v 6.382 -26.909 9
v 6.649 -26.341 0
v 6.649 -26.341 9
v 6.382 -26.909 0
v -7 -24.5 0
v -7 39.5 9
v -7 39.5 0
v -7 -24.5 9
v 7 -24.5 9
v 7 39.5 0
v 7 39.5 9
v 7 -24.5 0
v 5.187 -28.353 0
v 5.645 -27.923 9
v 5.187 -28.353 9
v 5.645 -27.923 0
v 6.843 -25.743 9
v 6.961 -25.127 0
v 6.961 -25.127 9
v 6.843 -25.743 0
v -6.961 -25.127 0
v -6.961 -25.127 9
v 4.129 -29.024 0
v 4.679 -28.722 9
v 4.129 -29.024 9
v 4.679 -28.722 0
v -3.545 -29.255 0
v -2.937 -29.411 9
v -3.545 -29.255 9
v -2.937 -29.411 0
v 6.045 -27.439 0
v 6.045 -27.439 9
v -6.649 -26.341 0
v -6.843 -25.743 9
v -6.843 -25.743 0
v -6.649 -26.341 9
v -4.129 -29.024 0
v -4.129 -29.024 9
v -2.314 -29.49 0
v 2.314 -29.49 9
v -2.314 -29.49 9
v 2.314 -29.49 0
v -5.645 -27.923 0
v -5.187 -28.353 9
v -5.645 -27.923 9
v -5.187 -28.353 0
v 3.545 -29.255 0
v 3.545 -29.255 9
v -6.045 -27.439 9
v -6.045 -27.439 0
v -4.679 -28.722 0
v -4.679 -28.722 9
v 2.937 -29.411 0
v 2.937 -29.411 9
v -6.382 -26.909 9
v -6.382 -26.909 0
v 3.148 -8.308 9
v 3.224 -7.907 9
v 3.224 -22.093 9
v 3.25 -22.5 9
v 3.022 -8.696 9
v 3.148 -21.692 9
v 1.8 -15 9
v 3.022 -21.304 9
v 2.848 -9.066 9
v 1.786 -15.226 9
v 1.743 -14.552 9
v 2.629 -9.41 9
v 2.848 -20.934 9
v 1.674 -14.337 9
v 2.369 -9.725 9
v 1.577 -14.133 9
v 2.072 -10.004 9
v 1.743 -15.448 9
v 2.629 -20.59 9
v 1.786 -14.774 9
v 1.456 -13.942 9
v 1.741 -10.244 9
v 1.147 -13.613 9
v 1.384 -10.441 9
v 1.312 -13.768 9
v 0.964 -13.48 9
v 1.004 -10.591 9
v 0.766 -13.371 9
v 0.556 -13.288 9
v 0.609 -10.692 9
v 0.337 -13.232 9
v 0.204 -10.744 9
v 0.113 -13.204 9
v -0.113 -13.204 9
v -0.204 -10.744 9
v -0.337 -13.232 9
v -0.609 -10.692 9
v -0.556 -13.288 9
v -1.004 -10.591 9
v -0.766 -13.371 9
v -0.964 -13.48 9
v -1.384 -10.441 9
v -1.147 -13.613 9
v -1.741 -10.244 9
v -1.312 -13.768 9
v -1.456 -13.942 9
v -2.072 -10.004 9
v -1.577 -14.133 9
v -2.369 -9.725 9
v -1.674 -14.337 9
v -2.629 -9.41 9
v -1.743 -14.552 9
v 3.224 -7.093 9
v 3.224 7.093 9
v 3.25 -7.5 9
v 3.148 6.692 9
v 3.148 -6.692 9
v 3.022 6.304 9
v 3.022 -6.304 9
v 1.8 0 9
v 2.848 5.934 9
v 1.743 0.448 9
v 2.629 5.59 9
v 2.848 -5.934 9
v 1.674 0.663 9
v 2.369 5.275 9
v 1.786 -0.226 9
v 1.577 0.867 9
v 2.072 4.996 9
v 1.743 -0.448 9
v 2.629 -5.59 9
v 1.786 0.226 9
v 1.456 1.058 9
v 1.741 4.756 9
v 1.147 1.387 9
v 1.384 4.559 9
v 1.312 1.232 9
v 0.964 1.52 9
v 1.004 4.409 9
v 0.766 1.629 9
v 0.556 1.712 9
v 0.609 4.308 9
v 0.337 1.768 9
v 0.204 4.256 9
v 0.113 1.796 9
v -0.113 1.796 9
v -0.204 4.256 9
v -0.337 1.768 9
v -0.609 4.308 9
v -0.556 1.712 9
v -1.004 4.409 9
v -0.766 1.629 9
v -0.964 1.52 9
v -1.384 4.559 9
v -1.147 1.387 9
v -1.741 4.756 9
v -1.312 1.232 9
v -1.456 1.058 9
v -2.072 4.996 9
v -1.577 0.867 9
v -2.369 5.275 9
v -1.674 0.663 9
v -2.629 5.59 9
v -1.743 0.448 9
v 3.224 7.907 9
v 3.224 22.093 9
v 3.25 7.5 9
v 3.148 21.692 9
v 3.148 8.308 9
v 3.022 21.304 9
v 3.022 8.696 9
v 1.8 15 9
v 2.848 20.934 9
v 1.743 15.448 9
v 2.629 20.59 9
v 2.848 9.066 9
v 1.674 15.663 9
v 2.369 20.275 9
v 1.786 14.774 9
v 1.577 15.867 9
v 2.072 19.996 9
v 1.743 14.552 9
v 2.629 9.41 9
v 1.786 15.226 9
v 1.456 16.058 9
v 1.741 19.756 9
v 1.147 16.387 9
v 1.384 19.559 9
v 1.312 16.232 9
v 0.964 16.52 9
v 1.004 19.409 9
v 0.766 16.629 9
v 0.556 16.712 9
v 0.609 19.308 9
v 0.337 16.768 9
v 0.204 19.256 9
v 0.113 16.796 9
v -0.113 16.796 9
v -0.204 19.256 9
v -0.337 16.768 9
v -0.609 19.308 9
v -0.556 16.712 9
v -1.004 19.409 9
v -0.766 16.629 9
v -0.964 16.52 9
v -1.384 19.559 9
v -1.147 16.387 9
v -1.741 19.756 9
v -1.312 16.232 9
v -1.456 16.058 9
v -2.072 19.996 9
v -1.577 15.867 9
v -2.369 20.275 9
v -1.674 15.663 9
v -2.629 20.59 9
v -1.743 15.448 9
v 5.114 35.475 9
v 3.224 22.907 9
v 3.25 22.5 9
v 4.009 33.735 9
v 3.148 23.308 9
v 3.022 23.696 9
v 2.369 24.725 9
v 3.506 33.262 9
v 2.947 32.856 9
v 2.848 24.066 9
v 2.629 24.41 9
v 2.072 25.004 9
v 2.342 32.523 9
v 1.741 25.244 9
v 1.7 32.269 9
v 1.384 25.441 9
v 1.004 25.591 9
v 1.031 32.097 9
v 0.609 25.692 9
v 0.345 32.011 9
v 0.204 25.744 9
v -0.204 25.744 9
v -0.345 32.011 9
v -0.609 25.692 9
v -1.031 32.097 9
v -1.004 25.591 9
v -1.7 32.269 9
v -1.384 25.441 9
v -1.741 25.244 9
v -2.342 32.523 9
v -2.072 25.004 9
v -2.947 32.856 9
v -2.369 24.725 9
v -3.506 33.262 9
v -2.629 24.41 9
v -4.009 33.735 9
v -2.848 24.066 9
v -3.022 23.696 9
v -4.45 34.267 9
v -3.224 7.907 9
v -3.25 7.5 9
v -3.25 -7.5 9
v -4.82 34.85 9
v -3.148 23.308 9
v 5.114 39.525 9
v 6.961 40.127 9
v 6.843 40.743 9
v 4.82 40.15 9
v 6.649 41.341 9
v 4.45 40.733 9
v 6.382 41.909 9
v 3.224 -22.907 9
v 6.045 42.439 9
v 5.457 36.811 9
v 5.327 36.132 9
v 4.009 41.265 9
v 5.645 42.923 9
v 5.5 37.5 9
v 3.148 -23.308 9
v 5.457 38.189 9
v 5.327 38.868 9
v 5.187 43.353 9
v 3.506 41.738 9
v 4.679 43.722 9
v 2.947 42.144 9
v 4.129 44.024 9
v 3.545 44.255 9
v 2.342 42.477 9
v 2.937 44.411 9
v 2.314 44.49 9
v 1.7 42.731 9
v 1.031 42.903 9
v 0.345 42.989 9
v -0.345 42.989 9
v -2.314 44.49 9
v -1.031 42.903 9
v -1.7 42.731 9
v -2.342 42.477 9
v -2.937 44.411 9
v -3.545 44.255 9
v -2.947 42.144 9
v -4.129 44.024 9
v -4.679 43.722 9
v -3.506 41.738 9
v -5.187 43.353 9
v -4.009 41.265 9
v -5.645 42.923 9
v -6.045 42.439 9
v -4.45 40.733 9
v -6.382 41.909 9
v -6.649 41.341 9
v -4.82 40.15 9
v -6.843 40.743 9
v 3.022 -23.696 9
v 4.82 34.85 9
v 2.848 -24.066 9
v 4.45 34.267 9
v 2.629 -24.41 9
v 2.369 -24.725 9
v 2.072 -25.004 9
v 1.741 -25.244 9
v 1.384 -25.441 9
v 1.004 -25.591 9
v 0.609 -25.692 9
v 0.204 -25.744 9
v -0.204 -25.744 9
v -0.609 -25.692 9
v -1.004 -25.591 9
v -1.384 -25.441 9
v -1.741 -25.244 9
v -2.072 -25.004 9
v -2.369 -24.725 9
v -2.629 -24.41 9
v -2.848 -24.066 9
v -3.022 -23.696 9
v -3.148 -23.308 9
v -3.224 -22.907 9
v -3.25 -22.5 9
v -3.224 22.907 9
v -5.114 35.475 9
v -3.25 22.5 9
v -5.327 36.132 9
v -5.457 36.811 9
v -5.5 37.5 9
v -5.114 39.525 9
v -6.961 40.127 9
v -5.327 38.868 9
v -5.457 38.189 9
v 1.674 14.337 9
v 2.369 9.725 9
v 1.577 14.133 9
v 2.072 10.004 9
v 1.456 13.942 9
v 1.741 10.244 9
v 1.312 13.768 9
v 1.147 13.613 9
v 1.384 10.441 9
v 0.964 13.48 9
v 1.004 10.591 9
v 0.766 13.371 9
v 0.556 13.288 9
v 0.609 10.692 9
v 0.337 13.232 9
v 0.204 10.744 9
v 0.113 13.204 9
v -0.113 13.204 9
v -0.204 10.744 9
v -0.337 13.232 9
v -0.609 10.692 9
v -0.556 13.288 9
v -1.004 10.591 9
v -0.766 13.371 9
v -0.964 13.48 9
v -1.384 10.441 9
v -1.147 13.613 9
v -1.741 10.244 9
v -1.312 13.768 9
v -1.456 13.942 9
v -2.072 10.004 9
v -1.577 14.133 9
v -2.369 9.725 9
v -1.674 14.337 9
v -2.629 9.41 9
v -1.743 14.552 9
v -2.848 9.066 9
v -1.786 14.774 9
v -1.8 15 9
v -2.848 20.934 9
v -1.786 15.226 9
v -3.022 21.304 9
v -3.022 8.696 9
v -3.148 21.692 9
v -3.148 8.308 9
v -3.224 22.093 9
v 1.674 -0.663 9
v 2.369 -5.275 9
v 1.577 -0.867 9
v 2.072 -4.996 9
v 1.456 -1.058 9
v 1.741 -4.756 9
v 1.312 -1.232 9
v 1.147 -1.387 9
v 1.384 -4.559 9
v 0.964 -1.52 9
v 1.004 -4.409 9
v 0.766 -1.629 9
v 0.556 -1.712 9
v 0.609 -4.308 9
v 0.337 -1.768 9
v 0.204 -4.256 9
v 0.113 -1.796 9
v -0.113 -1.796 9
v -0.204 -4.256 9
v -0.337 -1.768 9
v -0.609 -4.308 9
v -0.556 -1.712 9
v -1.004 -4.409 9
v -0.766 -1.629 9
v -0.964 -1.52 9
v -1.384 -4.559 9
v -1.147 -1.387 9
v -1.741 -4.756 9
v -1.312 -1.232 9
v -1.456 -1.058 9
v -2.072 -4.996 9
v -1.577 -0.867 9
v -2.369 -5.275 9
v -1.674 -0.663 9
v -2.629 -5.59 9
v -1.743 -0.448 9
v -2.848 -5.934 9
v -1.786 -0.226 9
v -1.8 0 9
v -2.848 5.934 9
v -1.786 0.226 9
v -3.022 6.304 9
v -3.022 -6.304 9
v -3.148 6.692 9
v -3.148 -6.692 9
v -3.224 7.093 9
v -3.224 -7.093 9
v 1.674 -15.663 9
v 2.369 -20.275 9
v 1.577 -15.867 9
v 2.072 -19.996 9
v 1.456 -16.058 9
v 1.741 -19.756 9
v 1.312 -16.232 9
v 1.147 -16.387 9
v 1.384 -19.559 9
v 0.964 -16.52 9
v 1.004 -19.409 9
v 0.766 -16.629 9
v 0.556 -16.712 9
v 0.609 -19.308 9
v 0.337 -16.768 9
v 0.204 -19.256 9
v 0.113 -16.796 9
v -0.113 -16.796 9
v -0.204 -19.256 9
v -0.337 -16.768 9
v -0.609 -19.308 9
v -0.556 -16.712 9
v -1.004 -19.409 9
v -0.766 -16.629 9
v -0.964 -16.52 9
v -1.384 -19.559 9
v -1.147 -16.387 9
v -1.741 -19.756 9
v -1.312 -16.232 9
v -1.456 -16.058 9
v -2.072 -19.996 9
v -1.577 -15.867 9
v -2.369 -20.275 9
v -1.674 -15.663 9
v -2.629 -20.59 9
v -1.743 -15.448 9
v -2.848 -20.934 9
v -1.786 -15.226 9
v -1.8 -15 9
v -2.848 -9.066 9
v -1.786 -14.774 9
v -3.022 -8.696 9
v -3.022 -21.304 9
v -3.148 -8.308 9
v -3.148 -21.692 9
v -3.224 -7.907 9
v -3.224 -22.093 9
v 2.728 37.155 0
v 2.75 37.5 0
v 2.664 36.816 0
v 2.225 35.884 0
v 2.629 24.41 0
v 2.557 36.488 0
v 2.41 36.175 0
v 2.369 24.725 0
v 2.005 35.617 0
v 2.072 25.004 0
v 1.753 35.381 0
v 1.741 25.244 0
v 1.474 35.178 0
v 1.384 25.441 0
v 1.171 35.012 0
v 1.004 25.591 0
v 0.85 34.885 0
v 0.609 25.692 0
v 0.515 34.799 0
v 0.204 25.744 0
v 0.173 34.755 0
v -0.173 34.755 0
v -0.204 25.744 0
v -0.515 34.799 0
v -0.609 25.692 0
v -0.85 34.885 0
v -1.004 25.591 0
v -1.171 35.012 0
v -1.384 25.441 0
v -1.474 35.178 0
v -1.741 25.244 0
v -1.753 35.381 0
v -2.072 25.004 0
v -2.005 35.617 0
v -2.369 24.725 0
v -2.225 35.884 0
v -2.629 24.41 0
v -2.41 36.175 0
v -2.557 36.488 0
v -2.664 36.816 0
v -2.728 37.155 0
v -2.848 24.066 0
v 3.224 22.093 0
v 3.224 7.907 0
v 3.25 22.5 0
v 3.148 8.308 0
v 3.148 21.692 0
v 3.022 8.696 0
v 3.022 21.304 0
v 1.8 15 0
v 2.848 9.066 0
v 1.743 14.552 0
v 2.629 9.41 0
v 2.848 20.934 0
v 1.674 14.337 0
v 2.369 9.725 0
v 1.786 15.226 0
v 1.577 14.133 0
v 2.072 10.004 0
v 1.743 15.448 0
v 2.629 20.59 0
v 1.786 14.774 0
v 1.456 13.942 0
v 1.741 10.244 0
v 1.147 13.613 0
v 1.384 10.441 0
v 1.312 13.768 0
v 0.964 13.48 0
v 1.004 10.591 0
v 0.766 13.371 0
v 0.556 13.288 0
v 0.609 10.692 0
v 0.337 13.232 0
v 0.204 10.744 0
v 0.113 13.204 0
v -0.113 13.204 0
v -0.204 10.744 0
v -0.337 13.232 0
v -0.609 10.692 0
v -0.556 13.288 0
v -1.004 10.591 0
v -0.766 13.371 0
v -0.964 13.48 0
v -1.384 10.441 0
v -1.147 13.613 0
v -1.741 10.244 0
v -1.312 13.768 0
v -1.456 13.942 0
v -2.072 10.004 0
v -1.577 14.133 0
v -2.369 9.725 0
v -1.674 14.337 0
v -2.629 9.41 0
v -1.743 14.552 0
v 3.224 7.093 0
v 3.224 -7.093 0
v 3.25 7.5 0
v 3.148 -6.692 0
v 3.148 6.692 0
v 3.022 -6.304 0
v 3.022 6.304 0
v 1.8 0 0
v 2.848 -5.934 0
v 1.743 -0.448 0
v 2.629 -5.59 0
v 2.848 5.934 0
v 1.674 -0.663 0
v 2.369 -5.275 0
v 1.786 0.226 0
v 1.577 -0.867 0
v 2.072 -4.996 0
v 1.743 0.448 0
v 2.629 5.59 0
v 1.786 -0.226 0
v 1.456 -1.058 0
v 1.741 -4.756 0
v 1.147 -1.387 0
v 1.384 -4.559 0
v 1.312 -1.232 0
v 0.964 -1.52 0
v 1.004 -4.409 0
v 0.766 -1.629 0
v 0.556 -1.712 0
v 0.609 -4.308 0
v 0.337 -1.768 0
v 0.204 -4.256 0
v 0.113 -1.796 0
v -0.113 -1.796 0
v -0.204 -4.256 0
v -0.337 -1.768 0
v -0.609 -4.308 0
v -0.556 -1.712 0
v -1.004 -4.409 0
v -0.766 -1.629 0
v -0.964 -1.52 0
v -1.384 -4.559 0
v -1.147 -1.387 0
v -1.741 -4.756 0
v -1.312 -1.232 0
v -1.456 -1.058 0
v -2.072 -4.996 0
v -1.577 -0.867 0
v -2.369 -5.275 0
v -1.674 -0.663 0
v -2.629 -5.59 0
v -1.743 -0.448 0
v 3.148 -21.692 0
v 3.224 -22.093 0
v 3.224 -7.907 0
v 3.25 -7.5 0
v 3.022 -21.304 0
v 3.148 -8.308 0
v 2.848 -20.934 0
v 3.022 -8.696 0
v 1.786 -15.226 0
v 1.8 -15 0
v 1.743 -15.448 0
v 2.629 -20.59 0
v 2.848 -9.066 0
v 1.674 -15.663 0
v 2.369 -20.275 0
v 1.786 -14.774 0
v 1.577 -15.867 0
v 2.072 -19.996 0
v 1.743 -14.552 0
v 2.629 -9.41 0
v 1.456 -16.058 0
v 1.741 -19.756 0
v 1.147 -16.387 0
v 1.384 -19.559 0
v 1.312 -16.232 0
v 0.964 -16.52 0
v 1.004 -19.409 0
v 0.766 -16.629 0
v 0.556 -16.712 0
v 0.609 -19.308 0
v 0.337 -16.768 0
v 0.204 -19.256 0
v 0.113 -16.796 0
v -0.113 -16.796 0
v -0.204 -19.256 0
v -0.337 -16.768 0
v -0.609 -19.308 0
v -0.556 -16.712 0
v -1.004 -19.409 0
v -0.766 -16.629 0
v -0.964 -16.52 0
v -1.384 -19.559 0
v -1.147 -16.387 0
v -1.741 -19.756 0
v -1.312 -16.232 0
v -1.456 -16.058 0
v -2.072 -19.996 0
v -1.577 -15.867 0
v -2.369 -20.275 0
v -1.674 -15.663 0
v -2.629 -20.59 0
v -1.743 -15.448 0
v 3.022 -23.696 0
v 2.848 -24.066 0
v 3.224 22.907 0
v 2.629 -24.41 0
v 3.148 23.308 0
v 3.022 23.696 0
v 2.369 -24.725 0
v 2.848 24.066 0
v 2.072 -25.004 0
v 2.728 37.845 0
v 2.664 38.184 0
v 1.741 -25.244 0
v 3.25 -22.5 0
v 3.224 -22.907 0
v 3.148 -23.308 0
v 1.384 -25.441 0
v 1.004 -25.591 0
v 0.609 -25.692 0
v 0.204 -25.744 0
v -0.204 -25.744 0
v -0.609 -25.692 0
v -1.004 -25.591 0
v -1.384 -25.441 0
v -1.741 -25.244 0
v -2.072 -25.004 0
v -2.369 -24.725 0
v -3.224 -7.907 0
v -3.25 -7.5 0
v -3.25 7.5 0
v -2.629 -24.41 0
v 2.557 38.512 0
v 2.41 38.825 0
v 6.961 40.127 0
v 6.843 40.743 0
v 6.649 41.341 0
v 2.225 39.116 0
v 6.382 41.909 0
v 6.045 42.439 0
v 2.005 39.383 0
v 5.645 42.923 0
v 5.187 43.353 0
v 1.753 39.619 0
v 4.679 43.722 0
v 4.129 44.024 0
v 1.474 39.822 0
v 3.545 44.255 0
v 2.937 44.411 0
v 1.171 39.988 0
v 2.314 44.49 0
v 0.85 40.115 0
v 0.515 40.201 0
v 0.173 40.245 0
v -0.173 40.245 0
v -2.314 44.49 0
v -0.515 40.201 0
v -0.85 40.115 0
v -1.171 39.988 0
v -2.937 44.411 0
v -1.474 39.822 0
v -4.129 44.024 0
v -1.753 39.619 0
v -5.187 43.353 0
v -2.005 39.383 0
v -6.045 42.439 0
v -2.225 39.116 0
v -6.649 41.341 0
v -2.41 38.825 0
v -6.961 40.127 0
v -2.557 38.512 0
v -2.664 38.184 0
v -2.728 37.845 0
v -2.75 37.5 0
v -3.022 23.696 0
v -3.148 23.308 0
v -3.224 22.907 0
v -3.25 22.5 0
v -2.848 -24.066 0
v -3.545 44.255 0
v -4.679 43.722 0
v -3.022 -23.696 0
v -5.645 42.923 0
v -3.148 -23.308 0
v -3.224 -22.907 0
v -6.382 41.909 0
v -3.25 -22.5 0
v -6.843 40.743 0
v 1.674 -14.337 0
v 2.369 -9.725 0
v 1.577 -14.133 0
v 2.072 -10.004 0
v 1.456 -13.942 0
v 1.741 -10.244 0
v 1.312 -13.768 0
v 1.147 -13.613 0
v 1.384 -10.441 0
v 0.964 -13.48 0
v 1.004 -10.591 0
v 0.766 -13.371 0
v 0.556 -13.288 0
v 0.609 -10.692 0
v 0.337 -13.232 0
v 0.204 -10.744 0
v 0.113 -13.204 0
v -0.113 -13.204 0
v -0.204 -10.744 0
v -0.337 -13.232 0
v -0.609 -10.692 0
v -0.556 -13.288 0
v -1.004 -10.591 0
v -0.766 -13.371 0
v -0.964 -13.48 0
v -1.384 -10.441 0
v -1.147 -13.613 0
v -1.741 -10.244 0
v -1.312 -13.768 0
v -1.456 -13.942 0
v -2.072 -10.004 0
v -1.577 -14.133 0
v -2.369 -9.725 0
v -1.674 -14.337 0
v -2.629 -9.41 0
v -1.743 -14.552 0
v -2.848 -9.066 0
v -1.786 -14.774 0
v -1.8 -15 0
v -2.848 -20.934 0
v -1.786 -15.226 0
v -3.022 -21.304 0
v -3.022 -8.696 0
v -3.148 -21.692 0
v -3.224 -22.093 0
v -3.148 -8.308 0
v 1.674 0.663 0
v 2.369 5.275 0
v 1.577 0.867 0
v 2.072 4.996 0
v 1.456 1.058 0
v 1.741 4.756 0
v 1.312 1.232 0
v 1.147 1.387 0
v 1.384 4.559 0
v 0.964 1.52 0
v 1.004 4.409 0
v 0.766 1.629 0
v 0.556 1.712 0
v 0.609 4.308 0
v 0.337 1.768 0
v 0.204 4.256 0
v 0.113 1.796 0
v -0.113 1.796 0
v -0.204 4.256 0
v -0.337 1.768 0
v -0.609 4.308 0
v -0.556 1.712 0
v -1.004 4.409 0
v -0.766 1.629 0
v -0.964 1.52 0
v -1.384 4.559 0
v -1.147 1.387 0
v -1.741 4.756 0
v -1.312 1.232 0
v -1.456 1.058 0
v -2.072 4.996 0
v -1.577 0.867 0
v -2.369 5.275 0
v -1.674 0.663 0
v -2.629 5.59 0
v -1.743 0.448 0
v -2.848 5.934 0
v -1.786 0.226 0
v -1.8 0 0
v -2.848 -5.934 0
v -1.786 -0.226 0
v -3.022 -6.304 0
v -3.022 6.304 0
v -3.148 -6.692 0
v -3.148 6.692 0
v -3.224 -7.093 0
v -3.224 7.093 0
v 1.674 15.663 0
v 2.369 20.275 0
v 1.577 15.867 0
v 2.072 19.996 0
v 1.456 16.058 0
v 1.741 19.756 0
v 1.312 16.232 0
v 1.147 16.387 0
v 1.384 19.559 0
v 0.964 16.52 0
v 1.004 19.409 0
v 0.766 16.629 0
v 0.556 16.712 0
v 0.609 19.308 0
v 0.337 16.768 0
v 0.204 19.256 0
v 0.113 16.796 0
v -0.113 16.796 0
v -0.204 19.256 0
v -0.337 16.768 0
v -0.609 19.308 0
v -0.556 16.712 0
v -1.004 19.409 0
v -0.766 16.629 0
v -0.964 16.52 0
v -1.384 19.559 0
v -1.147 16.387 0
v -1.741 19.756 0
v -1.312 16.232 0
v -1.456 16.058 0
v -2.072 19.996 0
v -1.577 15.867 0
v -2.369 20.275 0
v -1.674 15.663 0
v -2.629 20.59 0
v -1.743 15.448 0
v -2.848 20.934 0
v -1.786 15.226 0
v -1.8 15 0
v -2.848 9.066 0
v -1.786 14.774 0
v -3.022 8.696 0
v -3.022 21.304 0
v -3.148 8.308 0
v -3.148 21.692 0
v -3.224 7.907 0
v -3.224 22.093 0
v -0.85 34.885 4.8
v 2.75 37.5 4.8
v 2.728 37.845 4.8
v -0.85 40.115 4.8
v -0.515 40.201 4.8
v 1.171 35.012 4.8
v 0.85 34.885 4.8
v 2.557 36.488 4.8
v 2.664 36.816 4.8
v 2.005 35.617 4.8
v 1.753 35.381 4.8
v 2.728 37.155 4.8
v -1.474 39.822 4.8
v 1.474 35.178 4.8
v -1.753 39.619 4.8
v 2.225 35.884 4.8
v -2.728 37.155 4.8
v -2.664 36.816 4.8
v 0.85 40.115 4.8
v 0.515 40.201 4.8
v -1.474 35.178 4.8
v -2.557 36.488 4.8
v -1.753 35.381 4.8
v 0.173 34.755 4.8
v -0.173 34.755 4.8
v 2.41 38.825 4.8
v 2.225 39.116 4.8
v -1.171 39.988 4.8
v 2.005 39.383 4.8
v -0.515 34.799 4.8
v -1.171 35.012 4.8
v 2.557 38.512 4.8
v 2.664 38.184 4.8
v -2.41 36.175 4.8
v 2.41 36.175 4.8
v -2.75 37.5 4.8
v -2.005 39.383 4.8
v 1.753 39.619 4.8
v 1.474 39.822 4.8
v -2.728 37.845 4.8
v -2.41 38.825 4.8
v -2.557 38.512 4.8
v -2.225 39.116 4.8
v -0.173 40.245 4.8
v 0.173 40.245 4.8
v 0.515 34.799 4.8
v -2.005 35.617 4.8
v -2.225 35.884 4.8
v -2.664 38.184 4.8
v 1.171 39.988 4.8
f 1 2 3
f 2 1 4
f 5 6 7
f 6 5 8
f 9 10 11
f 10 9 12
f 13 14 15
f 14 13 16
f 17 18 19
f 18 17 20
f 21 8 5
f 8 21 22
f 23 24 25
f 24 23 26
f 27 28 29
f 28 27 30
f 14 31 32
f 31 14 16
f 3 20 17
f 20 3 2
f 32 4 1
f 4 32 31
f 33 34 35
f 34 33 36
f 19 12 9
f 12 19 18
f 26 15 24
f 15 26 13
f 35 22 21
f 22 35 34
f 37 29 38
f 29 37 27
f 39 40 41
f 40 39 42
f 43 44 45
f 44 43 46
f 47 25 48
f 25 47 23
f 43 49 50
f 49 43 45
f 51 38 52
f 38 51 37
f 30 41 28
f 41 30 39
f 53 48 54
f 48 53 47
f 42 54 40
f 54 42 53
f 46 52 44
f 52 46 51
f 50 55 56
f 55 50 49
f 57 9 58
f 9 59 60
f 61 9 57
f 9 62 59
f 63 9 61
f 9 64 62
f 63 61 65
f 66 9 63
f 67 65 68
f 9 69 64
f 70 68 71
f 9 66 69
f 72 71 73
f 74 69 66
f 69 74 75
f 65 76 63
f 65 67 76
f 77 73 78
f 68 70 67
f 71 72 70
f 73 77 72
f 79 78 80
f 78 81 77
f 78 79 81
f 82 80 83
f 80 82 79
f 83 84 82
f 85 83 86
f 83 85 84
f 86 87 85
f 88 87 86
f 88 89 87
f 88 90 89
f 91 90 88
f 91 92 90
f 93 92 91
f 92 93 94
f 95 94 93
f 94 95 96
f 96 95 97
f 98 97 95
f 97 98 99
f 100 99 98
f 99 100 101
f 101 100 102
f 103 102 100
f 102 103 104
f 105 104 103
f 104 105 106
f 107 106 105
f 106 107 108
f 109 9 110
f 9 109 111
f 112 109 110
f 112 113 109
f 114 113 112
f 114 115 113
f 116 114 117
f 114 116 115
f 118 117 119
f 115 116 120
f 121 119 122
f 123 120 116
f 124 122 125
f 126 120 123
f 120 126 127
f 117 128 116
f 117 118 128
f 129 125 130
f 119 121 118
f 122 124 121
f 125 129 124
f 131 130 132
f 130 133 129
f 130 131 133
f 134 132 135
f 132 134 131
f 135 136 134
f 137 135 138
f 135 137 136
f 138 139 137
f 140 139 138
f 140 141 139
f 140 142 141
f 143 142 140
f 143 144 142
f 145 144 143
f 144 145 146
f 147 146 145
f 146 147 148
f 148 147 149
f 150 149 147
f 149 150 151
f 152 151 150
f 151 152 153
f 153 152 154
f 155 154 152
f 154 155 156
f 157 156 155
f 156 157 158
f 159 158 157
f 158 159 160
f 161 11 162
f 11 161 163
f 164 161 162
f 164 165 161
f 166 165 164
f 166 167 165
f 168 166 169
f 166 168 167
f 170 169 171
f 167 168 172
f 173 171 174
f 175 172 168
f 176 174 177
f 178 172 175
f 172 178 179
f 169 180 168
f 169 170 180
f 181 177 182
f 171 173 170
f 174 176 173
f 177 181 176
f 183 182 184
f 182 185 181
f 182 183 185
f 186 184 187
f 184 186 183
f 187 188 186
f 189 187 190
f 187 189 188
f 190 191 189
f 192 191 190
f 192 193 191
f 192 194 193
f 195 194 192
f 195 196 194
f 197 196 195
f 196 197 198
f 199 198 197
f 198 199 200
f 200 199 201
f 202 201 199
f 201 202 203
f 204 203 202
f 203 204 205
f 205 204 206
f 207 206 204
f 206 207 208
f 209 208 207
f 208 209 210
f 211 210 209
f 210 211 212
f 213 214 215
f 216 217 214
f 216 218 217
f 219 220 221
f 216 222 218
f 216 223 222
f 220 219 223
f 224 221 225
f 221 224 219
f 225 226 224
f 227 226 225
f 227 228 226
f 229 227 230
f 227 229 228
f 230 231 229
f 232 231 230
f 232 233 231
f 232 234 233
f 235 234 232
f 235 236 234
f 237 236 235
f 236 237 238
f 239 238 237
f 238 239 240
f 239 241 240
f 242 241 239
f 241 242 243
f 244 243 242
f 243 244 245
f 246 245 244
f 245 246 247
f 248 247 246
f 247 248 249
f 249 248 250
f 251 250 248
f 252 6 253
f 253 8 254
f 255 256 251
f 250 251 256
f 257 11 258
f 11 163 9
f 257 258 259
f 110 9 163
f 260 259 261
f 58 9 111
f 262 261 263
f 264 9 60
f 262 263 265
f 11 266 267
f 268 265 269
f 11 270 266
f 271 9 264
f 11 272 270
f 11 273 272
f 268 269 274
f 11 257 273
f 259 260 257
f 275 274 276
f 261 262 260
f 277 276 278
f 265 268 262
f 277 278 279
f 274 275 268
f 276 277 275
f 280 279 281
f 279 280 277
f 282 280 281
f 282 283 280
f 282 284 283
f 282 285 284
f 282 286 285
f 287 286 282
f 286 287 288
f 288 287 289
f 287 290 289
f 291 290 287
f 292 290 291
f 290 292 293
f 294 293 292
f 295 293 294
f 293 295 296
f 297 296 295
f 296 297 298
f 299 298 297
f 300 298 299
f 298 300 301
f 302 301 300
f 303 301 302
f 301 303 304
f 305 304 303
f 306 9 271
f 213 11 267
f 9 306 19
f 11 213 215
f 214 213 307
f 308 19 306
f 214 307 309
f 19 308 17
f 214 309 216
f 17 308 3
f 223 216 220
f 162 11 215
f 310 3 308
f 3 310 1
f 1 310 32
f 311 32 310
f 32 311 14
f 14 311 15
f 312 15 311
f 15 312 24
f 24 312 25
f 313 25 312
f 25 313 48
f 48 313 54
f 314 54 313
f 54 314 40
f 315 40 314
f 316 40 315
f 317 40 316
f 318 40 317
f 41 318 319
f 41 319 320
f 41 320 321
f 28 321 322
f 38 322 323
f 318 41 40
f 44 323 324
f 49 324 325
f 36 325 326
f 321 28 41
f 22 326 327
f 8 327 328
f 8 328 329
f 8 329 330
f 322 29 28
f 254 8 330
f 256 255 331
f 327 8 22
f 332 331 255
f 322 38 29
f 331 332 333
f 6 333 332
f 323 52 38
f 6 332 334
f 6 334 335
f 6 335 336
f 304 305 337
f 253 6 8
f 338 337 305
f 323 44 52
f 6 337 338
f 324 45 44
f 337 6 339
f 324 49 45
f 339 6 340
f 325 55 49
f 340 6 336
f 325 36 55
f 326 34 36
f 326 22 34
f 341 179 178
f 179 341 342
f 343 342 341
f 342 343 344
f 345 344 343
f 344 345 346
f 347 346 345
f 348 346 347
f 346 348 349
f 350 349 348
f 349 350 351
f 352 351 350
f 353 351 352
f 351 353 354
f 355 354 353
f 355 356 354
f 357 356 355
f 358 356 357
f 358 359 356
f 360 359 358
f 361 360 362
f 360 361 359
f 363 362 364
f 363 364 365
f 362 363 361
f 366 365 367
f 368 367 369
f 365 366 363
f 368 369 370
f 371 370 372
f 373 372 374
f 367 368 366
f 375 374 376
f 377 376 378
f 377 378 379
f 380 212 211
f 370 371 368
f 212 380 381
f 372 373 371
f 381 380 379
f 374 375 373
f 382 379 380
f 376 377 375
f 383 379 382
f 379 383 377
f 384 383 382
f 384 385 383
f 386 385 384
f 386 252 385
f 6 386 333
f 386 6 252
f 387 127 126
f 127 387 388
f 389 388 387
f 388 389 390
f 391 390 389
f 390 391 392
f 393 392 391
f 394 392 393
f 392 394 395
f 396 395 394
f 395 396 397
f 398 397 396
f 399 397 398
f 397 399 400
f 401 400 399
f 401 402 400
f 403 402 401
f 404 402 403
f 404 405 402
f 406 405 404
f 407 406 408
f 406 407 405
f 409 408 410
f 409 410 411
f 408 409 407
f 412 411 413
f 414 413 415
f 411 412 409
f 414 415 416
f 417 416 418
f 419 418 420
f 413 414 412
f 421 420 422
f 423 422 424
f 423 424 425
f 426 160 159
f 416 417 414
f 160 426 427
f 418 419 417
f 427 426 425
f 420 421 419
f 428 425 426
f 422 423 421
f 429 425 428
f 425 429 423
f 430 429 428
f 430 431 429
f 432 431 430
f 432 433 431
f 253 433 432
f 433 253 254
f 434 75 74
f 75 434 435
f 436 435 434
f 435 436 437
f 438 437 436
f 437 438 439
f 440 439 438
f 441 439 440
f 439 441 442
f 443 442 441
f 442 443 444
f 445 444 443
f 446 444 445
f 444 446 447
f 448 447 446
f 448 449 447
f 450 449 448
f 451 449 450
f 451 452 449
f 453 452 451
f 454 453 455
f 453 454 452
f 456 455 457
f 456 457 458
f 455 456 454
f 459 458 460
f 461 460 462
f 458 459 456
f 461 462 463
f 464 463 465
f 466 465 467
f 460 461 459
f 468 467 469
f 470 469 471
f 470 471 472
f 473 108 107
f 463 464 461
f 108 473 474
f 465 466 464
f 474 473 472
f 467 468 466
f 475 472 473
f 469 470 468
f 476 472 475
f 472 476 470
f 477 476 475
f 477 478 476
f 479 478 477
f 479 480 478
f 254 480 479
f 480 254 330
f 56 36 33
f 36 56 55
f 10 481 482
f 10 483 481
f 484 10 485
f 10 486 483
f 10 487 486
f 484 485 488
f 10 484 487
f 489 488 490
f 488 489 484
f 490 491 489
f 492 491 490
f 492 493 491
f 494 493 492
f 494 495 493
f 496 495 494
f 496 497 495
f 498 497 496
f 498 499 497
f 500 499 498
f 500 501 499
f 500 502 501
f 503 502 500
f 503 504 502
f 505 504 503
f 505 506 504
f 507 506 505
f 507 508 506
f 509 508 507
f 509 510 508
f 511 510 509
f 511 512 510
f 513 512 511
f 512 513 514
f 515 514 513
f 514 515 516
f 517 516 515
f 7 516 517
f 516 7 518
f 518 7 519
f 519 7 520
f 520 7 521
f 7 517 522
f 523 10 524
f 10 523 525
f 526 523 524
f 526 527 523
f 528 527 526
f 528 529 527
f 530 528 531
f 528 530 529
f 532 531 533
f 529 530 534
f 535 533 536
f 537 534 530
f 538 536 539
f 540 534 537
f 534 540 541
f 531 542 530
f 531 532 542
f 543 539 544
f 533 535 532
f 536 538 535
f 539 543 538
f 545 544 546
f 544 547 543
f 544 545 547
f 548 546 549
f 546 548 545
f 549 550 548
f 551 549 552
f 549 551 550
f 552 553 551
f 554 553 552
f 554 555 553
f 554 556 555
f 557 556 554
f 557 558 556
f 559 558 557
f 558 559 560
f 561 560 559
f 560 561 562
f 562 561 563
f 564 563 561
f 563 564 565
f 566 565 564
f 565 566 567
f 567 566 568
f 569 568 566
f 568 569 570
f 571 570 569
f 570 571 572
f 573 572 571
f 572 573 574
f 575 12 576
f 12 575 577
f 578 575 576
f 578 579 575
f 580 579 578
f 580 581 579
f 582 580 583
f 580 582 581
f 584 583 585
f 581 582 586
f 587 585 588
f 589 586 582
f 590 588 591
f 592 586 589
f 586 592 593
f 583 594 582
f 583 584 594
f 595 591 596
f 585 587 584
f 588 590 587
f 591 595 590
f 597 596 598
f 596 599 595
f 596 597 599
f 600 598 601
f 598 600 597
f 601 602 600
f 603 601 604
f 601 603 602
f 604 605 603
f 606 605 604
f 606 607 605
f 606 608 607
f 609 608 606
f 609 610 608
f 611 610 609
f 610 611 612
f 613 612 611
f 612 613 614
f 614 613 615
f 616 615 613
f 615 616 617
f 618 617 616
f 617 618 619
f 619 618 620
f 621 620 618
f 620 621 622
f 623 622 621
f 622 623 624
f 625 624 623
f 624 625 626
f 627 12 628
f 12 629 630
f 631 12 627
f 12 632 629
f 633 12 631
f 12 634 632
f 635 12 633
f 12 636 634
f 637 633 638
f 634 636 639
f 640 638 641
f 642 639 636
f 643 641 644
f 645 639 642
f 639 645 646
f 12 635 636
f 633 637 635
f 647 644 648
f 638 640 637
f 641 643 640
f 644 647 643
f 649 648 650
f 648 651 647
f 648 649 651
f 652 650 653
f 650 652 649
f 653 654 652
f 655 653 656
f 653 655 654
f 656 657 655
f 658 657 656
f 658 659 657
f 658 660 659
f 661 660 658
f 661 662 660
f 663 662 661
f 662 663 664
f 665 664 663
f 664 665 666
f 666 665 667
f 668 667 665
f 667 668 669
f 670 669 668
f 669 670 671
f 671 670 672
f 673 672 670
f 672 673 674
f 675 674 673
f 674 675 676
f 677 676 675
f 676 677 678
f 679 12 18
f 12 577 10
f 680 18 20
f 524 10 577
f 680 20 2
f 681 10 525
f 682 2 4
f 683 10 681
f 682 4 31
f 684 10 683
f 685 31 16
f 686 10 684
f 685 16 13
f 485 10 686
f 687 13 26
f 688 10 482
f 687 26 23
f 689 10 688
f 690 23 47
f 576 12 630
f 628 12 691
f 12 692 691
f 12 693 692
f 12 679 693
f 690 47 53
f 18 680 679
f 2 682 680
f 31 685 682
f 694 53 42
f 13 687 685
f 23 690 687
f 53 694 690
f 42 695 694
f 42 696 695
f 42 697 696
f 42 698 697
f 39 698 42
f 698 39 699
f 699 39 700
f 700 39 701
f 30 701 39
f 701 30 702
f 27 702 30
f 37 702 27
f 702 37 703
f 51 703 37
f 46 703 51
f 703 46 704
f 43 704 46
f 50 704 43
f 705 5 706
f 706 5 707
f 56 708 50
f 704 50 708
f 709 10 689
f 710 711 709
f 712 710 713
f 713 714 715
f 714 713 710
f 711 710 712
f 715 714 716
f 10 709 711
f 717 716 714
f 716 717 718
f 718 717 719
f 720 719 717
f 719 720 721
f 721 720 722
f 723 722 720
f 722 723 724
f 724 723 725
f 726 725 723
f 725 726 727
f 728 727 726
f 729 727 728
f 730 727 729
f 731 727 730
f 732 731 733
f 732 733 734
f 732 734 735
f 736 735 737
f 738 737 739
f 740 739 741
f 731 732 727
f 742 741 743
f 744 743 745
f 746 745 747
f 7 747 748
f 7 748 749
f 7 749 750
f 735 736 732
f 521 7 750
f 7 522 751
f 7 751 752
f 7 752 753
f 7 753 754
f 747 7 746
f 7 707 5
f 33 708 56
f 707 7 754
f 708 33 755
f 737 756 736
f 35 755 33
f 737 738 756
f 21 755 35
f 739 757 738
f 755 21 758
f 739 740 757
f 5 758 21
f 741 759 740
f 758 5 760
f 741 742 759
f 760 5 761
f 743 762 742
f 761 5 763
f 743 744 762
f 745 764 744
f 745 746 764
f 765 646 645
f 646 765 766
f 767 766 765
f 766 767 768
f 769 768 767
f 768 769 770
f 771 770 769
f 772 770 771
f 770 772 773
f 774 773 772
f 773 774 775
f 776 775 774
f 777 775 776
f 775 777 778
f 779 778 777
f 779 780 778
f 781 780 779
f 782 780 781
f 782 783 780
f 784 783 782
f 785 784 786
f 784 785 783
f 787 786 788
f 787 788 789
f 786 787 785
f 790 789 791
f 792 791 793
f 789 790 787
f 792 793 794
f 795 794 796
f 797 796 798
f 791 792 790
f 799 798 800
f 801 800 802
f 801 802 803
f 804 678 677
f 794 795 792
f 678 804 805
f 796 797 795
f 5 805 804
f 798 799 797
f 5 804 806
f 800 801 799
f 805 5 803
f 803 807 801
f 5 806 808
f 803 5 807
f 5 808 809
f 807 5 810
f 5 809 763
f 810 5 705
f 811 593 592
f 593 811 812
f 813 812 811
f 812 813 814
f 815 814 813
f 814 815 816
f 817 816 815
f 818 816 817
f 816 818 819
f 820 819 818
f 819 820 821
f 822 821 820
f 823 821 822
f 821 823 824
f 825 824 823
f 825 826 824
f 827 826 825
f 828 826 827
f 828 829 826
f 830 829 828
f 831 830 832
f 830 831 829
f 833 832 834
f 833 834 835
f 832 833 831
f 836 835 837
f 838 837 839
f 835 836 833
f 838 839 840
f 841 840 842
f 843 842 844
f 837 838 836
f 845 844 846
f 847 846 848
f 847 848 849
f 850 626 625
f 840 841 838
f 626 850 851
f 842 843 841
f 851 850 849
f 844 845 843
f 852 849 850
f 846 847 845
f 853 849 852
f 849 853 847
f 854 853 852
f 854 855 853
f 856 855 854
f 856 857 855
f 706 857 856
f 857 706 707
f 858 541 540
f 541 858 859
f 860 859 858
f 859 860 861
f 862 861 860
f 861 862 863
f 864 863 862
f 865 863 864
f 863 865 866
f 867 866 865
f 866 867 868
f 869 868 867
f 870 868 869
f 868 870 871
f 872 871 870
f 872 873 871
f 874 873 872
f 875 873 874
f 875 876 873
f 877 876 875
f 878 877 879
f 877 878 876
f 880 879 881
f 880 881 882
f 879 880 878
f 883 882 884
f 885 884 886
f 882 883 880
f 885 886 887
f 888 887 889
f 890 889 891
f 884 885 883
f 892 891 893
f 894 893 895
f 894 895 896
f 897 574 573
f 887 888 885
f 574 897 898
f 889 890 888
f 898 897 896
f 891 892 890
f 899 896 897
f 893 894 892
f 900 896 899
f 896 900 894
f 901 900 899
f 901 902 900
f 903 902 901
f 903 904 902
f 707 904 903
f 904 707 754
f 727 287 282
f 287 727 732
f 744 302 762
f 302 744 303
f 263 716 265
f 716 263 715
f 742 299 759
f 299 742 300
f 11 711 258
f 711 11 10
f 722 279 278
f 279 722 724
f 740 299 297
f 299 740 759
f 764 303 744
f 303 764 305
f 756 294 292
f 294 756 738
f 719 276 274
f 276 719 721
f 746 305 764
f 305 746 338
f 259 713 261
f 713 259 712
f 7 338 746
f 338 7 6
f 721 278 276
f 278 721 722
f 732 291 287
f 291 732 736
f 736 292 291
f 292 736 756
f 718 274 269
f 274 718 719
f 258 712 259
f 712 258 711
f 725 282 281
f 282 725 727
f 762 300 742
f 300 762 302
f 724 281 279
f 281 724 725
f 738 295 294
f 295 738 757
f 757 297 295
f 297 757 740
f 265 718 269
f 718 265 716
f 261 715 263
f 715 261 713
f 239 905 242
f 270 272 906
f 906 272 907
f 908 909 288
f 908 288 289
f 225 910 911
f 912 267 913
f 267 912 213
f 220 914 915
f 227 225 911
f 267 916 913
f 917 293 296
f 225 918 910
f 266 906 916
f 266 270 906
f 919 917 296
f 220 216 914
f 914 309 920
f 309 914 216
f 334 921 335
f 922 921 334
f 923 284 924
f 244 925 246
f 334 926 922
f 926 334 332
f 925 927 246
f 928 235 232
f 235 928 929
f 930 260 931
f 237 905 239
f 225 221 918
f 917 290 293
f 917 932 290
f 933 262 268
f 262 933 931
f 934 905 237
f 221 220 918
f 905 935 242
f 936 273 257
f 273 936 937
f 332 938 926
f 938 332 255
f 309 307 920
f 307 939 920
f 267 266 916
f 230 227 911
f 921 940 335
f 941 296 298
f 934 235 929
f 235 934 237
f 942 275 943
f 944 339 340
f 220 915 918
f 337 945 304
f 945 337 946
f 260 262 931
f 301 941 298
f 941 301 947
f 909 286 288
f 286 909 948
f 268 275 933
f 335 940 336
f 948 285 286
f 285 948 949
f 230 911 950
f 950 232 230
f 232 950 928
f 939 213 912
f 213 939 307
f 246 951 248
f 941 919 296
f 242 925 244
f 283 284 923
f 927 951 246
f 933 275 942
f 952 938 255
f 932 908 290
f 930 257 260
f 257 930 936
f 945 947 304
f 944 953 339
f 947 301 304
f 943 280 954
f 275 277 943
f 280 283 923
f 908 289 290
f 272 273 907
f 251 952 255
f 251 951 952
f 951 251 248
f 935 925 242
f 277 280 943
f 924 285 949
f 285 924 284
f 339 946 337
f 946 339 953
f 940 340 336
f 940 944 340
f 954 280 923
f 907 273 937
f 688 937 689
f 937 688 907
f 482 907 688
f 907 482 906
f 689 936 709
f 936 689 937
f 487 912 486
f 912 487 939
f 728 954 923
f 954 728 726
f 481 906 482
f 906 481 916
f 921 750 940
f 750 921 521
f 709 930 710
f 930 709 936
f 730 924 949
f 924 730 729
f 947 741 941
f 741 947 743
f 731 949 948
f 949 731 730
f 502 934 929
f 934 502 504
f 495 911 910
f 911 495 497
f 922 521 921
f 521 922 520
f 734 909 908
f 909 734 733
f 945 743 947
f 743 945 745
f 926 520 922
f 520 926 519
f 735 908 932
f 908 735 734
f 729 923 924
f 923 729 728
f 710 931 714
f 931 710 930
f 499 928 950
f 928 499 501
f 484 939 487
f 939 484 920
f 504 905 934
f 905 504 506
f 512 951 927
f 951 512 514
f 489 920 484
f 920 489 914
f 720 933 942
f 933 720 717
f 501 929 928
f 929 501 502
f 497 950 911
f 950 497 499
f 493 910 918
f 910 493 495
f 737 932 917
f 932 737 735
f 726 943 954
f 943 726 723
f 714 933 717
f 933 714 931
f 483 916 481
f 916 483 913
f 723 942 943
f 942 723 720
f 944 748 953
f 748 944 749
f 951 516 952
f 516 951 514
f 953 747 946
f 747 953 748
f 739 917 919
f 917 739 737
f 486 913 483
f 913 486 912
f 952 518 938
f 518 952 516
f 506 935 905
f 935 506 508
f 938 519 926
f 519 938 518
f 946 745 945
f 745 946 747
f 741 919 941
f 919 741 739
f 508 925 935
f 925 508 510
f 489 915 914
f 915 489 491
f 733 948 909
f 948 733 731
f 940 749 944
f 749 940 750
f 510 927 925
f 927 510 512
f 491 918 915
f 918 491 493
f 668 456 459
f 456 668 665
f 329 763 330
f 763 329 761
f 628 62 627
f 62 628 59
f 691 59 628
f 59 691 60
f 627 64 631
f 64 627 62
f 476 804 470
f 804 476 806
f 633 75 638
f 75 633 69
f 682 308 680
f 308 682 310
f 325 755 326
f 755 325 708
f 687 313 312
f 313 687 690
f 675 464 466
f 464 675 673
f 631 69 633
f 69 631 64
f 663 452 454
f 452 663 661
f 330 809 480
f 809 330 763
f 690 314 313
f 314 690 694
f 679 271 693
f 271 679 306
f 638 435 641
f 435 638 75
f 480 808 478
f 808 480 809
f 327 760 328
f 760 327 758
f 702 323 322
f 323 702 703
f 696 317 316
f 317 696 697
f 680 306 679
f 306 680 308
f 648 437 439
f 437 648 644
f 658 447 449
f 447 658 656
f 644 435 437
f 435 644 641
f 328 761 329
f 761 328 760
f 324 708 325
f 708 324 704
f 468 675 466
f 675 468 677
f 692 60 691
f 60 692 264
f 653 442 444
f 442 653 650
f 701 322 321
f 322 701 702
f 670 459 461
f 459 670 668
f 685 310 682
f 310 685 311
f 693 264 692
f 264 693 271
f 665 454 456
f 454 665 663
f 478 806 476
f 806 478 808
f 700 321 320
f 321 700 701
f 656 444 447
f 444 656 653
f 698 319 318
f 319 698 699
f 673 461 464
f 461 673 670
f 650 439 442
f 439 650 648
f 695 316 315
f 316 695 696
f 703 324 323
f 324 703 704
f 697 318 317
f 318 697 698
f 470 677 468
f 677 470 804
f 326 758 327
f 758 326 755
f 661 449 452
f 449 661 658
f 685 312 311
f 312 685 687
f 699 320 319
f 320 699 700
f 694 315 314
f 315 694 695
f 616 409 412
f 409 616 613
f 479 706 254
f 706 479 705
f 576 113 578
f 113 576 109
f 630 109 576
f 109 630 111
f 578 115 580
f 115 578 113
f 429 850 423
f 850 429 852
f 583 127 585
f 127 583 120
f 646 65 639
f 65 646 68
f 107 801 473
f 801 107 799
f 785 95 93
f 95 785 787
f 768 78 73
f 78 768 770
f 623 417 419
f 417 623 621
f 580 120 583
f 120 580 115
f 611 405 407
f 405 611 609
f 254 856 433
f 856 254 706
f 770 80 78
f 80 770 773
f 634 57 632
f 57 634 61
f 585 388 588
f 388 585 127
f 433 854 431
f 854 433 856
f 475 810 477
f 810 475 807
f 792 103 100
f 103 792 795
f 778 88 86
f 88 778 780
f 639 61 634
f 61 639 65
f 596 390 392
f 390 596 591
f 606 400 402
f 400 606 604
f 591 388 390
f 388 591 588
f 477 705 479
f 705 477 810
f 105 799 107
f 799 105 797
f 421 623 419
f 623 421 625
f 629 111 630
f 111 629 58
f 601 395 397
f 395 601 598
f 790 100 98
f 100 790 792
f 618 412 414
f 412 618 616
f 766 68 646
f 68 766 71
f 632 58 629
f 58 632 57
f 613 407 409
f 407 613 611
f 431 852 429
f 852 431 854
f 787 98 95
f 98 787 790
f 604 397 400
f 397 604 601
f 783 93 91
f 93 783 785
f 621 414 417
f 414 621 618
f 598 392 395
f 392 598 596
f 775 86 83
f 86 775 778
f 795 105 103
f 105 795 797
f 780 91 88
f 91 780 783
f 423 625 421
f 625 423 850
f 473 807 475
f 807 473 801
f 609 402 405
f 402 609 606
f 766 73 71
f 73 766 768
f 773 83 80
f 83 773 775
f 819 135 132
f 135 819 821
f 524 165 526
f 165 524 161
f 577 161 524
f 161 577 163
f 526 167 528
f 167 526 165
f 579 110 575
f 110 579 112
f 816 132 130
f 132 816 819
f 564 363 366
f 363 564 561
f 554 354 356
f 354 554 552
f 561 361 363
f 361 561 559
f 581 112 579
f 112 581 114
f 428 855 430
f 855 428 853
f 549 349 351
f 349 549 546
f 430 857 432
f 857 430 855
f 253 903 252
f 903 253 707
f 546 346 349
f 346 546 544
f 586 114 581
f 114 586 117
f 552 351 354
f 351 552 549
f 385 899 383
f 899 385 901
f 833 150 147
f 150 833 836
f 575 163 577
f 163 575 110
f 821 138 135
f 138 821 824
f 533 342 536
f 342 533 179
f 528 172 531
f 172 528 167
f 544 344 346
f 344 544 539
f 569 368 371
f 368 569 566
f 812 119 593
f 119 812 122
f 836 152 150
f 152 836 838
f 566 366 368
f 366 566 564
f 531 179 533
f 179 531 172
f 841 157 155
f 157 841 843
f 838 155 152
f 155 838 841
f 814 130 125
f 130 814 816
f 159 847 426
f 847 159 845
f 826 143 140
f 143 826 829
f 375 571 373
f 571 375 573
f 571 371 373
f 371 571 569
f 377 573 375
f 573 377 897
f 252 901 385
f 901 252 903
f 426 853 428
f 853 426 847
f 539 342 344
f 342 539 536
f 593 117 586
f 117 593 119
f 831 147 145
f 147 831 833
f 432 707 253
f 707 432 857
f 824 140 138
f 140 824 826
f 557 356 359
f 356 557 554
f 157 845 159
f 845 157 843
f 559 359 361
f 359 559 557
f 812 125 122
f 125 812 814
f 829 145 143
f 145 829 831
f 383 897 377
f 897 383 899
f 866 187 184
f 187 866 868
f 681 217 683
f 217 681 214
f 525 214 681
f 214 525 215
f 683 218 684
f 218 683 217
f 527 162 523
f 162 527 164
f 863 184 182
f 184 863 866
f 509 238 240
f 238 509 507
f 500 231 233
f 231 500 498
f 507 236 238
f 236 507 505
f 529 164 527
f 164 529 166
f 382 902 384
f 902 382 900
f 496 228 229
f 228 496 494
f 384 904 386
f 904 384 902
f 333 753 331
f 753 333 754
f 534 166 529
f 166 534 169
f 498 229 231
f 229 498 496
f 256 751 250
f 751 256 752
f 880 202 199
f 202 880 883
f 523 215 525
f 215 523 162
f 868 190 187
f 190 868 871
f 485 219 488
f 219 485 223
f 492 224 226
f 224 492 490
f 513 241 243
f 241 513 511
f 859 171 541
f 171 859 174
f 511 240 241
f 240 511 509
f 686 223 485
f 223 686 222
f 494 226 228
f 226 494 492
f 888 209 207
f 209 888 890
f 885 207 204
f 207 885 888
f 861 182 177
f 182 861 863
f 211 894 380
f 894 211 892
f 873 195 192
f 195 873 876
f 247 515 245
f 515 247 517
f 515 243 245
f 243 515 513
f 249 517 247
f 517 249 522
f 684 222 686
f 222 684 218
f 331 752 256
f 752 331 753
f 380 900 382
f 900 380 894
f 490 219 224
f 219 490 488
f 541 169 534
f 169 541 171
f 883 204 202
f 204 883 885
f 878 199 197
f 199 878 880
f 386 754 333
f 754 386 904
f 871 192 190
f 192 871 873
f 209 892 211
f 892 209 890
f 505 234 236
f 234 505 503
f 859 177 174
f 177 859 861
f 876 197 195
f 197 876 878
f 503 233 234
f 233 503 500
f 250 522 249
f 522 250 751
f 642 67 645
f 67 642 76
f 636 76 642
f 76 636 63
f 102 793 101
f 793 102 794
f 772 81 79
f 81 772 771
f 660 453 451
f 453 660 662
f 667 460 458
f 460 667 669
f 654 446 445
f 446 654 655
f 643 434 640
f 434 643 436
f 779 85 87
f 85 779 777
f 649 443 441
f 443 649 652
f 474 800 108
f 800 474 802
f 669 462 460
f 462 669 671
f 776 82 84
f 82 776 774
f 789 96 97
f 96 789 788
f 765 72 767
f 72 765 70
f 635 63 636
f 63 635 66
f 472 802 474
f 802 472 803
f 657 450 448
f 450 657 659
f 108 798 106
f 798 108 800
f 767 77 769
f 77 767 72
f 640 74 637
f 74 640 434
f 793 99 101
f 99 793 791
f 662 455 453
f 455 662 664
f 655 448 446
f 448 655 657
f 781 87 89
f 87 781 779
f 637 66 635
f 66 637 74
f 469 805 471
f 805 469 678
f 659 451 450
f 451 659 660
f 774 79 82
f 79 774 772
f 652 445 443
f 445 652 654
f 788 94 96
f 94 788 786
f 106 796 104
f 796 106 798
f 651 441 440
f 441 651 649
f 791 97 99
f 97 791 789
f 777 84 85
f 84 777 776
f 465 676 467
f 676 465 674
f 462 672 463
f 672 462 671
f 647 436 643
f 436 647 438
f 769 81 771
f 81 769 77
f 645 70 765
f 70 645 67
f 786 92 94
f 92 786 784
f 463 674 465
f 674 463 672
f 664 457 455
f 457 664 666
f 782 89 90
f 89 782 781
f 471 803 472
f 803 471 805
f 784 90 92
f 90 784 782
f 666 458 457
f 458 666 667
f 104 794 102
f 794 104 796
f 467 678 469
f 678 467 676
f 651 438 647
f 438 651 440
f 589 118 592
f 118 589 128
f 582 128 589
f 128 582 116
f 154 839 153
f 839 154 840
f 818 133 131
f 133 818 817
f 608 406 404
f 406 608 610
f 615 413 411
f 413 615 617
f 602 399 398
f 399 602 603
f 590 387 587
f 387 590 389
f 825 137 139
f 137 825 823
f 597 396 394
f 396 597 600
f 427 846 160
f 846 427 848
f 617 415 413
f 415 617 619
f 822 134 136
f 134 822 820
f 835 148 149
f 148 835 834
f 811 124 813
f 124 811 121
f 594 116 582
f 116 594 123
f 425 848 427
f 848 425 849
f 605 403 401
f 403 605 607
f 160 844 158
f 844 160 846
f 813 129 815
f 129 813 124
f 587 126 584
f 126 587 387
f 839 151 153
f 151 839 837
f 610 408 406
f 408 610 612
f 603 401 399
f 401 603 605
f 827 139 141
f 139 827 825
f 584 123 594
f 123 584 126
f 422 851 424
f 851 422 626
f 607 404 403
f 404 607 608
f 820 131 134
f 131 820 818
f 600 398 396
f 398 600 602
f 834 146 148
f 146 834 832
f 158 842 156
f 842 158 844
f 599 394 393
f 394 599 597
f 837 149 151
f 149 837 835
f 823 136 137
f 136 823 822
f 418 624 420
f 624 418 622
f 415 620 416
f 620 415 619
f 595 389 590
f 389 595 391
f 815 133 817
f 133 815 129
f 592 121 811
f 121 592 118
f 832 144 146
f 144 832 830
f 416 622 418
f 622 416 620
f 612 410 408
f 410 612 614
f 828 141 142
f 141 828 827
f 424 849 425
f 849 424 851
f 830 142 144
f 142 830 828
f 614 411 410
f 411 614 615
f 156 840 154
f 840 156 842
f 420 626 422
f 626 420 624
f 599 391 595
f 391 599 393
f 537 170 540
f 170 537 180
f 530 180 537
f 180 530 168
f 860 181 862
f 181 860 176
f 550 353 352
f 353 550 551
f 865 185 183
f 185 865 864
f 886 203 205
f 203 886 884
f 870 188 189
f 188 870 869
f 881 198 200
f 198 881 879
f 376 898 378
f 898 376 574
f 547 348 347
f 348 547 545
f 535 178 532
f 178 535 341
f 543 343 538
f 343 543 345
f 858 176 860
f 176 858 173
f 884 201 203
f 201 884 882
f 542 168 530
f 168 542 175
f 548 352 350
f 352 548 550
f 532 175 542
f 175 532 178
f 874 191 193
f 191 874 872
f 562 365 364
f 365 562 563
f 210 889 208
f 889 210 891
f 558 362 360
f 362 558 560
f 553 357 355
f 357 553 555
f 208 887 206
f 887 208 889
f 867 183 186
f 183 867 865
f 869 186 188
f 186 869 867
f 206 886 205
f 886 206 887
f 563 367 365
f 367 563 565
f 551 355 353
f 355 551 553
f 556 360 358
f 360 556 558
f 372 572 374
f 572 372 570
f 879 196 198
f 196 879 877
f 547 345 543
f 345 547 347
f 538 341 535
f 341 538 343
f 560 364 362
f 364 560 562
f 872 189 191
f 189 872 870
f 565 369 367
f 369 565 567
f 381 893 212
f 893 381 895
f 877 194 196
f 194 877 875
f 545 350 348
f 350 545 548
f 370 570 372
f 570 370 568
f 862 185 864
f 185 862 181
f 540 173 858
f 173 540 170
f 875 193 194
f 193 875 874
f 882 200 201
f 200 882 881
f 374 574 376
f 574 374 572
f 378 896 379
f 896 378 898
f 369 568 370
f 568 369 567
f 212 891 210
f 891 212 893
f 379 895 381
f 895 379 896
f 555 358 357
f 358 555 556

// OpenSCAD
$fn = 50;


difference() {
	union() {
		hull() {
			translate(v = [-2.0000000000, 24.5000000000, 0]) {
				cylinder(h = 9, r = 5);
			}
			translate(v = [2.0000000000, 24.5000000000, 0]) {
				cylinder(h = 9, r = 5);
			}
			translate(v = [-2.0000000000, -24.5000000000, 0]) {
				cylinder(h = 9, r = 5);
			}
			translate(v = [2.0000000000, -24.5000000000, 0]) {
				cylinder(h = 9, r = 5);
			}
		}
		translate(v = [0.0000000000, 30.0000000000, 0]) {
			hull() {
				translate(v = [-2.0000000000, 9.5000000000, 0]) {
					cylinder(h = 9, r = 5);
				}
				translate(v = [2.0000000000, 9.5000000000, 0]) {
					cylinder(h = 9, r = 5);
				}
				translate(v = [-2.0000000000, -9.5000000000, 0]) {
					cylinder(h = 9, r = 5);
				}
				translate(v = [2.0000000000, -9.5000000000, 0]) {
					cylinder(h = 9, r = 5);
				}
			}
		}
		translate(v = [0.0000000000, 30.0000000000, 0]) {
			hull() {
				translate(v = [-2.0000000000, 9.5000000000, 0]) {
					cylinder(h = 9, r = 5);
				}
				translate(v = [2.0000000000, 9.5000000000, 0]) {
					cylinder(h = 9, r = 5);
				}
				translate(v = [-2.0000000000, -9.5000000000, 0]) {
					cylinder(h = 9, r = 5);
				}
				translate(v = [2.0000000000, -9.5000000000, 0]) {
					cylinder(h = 9, r = 5);
				}
			}
		}
	}
	union() {
		translate(v = [0.0000000000, 37.5000000000, 9]) {
			rotate(a = [0, 0, 0]) {
				difference() {
					union() {
						#translate(v = [0, 0, -9.0000000000]) {
							cylinder(h = 9, r = 2.2500000000);
						}
						#translate(v = [0, 0, -4.2000000000]) {
							cylinder(h = 4.2000000000, r1 = 2.7500000000, r2 = 5.5000000000);
						}
						#translate(v = [0, 0, -9.0000000000]) {
							cylinder(h = 9, r = 2.7500000000);
						}
						#translate(v = [0, 0, -9.0000000000]) {
							cylinder(h = 9, r = 2.2500000000);
						}
					}
					union();
				}
			}
		}
		translate(v = [0.0000000000, 37.5000000000, 9]) {
			rotate(a = [0, 0, 0]) {
				difference() {
					union() {
						#translate(v = [0, 0, -9.0000000000]) {
							cylinder(h = 9, r = 2.2500000000);
						}
						#translate(v = [0, 0, -4.2000000000]) {
							cylinder(h = 4.2000000000, r1 = 2.7500000000, r2 = 5.5000000000);
						}
						#translate(v = [0, 0, -9.0000000000]) {
							cylinder(h = 9, r = 2.7500000000);
						}
						#translate(v = [0, 0, -9.0000000000]) {
							cylinder(h = 9, r = 2.2500000000);
						}
					}
					union();
				}
			}
		}
		translate(v = [0.0000000000, -22.5000000000, 0]) {
			translate(v = [0, 0, -100]) {
				cylinder(h = 200, r = 3.2500000000);
			}
		}
		translate(v = [0.0000000000, -7.5000000000, 0]) {
			translate(v = [0, 0, -100]) {
				cylinder(h = 200, r = 3.2500000000);
			}
		}
		translate(v = [0.0000000000, 7.5000000000, 0]) {
			translate(v = [0, 0, -100]) {
				cylinder(h = 200, r = 3.2500000000);
			}
		}
		translate(v = [0.0000000000, 22.5000000000, 0]) {
			translate(v = [0, 0, -100]) {
				cylinder(h = 200, r = 3.2500000000);
			}
		}
		translate(v = [0.0000000000, -22.5000000000, 0]) {
			translate(v = [0, 0, -100]) {
				cylinder(h = 200, r = 1.8000000000);
			}
		}
		translate(v = [0.0000000000, -15.0000000000, 0]) {
			translate(v = [0, 0, -100]) {
				cylinder(h = 200, r = 1.8000000000);
			}
		}
		translate(v = [0.0000000000, -7.5000000000, 0]) {
			translate(v = [0, 0, -100]) {
				cylinder(h = 200, r = 1.8000000000);
			}
		}
		translate(v = [0, 0, -100]) {
			cylinder(h = 200, r = 1.8000000000);
		}
		translate(v = [0.0000000000, 7.5000000000, 0]) {
			translate(v = [0, 0, -100]) {
				cylinder(h = 200, r = 1.8000000000);
			}
		}
		translate(v = [0.0000000000, 15.0000000000, 0]) {
			translate(v = [0, 0, -100]) {
				cylinder(h = 200, r = 1.8000000000);
			}
		}
		translate(v = [0.0000000000, 22.5000000000, 0]) {
			translate(v = [0, 0, -100]) {
				cylinder(h = 200, r = 1.8000000000);
			}
		}
	}
}
